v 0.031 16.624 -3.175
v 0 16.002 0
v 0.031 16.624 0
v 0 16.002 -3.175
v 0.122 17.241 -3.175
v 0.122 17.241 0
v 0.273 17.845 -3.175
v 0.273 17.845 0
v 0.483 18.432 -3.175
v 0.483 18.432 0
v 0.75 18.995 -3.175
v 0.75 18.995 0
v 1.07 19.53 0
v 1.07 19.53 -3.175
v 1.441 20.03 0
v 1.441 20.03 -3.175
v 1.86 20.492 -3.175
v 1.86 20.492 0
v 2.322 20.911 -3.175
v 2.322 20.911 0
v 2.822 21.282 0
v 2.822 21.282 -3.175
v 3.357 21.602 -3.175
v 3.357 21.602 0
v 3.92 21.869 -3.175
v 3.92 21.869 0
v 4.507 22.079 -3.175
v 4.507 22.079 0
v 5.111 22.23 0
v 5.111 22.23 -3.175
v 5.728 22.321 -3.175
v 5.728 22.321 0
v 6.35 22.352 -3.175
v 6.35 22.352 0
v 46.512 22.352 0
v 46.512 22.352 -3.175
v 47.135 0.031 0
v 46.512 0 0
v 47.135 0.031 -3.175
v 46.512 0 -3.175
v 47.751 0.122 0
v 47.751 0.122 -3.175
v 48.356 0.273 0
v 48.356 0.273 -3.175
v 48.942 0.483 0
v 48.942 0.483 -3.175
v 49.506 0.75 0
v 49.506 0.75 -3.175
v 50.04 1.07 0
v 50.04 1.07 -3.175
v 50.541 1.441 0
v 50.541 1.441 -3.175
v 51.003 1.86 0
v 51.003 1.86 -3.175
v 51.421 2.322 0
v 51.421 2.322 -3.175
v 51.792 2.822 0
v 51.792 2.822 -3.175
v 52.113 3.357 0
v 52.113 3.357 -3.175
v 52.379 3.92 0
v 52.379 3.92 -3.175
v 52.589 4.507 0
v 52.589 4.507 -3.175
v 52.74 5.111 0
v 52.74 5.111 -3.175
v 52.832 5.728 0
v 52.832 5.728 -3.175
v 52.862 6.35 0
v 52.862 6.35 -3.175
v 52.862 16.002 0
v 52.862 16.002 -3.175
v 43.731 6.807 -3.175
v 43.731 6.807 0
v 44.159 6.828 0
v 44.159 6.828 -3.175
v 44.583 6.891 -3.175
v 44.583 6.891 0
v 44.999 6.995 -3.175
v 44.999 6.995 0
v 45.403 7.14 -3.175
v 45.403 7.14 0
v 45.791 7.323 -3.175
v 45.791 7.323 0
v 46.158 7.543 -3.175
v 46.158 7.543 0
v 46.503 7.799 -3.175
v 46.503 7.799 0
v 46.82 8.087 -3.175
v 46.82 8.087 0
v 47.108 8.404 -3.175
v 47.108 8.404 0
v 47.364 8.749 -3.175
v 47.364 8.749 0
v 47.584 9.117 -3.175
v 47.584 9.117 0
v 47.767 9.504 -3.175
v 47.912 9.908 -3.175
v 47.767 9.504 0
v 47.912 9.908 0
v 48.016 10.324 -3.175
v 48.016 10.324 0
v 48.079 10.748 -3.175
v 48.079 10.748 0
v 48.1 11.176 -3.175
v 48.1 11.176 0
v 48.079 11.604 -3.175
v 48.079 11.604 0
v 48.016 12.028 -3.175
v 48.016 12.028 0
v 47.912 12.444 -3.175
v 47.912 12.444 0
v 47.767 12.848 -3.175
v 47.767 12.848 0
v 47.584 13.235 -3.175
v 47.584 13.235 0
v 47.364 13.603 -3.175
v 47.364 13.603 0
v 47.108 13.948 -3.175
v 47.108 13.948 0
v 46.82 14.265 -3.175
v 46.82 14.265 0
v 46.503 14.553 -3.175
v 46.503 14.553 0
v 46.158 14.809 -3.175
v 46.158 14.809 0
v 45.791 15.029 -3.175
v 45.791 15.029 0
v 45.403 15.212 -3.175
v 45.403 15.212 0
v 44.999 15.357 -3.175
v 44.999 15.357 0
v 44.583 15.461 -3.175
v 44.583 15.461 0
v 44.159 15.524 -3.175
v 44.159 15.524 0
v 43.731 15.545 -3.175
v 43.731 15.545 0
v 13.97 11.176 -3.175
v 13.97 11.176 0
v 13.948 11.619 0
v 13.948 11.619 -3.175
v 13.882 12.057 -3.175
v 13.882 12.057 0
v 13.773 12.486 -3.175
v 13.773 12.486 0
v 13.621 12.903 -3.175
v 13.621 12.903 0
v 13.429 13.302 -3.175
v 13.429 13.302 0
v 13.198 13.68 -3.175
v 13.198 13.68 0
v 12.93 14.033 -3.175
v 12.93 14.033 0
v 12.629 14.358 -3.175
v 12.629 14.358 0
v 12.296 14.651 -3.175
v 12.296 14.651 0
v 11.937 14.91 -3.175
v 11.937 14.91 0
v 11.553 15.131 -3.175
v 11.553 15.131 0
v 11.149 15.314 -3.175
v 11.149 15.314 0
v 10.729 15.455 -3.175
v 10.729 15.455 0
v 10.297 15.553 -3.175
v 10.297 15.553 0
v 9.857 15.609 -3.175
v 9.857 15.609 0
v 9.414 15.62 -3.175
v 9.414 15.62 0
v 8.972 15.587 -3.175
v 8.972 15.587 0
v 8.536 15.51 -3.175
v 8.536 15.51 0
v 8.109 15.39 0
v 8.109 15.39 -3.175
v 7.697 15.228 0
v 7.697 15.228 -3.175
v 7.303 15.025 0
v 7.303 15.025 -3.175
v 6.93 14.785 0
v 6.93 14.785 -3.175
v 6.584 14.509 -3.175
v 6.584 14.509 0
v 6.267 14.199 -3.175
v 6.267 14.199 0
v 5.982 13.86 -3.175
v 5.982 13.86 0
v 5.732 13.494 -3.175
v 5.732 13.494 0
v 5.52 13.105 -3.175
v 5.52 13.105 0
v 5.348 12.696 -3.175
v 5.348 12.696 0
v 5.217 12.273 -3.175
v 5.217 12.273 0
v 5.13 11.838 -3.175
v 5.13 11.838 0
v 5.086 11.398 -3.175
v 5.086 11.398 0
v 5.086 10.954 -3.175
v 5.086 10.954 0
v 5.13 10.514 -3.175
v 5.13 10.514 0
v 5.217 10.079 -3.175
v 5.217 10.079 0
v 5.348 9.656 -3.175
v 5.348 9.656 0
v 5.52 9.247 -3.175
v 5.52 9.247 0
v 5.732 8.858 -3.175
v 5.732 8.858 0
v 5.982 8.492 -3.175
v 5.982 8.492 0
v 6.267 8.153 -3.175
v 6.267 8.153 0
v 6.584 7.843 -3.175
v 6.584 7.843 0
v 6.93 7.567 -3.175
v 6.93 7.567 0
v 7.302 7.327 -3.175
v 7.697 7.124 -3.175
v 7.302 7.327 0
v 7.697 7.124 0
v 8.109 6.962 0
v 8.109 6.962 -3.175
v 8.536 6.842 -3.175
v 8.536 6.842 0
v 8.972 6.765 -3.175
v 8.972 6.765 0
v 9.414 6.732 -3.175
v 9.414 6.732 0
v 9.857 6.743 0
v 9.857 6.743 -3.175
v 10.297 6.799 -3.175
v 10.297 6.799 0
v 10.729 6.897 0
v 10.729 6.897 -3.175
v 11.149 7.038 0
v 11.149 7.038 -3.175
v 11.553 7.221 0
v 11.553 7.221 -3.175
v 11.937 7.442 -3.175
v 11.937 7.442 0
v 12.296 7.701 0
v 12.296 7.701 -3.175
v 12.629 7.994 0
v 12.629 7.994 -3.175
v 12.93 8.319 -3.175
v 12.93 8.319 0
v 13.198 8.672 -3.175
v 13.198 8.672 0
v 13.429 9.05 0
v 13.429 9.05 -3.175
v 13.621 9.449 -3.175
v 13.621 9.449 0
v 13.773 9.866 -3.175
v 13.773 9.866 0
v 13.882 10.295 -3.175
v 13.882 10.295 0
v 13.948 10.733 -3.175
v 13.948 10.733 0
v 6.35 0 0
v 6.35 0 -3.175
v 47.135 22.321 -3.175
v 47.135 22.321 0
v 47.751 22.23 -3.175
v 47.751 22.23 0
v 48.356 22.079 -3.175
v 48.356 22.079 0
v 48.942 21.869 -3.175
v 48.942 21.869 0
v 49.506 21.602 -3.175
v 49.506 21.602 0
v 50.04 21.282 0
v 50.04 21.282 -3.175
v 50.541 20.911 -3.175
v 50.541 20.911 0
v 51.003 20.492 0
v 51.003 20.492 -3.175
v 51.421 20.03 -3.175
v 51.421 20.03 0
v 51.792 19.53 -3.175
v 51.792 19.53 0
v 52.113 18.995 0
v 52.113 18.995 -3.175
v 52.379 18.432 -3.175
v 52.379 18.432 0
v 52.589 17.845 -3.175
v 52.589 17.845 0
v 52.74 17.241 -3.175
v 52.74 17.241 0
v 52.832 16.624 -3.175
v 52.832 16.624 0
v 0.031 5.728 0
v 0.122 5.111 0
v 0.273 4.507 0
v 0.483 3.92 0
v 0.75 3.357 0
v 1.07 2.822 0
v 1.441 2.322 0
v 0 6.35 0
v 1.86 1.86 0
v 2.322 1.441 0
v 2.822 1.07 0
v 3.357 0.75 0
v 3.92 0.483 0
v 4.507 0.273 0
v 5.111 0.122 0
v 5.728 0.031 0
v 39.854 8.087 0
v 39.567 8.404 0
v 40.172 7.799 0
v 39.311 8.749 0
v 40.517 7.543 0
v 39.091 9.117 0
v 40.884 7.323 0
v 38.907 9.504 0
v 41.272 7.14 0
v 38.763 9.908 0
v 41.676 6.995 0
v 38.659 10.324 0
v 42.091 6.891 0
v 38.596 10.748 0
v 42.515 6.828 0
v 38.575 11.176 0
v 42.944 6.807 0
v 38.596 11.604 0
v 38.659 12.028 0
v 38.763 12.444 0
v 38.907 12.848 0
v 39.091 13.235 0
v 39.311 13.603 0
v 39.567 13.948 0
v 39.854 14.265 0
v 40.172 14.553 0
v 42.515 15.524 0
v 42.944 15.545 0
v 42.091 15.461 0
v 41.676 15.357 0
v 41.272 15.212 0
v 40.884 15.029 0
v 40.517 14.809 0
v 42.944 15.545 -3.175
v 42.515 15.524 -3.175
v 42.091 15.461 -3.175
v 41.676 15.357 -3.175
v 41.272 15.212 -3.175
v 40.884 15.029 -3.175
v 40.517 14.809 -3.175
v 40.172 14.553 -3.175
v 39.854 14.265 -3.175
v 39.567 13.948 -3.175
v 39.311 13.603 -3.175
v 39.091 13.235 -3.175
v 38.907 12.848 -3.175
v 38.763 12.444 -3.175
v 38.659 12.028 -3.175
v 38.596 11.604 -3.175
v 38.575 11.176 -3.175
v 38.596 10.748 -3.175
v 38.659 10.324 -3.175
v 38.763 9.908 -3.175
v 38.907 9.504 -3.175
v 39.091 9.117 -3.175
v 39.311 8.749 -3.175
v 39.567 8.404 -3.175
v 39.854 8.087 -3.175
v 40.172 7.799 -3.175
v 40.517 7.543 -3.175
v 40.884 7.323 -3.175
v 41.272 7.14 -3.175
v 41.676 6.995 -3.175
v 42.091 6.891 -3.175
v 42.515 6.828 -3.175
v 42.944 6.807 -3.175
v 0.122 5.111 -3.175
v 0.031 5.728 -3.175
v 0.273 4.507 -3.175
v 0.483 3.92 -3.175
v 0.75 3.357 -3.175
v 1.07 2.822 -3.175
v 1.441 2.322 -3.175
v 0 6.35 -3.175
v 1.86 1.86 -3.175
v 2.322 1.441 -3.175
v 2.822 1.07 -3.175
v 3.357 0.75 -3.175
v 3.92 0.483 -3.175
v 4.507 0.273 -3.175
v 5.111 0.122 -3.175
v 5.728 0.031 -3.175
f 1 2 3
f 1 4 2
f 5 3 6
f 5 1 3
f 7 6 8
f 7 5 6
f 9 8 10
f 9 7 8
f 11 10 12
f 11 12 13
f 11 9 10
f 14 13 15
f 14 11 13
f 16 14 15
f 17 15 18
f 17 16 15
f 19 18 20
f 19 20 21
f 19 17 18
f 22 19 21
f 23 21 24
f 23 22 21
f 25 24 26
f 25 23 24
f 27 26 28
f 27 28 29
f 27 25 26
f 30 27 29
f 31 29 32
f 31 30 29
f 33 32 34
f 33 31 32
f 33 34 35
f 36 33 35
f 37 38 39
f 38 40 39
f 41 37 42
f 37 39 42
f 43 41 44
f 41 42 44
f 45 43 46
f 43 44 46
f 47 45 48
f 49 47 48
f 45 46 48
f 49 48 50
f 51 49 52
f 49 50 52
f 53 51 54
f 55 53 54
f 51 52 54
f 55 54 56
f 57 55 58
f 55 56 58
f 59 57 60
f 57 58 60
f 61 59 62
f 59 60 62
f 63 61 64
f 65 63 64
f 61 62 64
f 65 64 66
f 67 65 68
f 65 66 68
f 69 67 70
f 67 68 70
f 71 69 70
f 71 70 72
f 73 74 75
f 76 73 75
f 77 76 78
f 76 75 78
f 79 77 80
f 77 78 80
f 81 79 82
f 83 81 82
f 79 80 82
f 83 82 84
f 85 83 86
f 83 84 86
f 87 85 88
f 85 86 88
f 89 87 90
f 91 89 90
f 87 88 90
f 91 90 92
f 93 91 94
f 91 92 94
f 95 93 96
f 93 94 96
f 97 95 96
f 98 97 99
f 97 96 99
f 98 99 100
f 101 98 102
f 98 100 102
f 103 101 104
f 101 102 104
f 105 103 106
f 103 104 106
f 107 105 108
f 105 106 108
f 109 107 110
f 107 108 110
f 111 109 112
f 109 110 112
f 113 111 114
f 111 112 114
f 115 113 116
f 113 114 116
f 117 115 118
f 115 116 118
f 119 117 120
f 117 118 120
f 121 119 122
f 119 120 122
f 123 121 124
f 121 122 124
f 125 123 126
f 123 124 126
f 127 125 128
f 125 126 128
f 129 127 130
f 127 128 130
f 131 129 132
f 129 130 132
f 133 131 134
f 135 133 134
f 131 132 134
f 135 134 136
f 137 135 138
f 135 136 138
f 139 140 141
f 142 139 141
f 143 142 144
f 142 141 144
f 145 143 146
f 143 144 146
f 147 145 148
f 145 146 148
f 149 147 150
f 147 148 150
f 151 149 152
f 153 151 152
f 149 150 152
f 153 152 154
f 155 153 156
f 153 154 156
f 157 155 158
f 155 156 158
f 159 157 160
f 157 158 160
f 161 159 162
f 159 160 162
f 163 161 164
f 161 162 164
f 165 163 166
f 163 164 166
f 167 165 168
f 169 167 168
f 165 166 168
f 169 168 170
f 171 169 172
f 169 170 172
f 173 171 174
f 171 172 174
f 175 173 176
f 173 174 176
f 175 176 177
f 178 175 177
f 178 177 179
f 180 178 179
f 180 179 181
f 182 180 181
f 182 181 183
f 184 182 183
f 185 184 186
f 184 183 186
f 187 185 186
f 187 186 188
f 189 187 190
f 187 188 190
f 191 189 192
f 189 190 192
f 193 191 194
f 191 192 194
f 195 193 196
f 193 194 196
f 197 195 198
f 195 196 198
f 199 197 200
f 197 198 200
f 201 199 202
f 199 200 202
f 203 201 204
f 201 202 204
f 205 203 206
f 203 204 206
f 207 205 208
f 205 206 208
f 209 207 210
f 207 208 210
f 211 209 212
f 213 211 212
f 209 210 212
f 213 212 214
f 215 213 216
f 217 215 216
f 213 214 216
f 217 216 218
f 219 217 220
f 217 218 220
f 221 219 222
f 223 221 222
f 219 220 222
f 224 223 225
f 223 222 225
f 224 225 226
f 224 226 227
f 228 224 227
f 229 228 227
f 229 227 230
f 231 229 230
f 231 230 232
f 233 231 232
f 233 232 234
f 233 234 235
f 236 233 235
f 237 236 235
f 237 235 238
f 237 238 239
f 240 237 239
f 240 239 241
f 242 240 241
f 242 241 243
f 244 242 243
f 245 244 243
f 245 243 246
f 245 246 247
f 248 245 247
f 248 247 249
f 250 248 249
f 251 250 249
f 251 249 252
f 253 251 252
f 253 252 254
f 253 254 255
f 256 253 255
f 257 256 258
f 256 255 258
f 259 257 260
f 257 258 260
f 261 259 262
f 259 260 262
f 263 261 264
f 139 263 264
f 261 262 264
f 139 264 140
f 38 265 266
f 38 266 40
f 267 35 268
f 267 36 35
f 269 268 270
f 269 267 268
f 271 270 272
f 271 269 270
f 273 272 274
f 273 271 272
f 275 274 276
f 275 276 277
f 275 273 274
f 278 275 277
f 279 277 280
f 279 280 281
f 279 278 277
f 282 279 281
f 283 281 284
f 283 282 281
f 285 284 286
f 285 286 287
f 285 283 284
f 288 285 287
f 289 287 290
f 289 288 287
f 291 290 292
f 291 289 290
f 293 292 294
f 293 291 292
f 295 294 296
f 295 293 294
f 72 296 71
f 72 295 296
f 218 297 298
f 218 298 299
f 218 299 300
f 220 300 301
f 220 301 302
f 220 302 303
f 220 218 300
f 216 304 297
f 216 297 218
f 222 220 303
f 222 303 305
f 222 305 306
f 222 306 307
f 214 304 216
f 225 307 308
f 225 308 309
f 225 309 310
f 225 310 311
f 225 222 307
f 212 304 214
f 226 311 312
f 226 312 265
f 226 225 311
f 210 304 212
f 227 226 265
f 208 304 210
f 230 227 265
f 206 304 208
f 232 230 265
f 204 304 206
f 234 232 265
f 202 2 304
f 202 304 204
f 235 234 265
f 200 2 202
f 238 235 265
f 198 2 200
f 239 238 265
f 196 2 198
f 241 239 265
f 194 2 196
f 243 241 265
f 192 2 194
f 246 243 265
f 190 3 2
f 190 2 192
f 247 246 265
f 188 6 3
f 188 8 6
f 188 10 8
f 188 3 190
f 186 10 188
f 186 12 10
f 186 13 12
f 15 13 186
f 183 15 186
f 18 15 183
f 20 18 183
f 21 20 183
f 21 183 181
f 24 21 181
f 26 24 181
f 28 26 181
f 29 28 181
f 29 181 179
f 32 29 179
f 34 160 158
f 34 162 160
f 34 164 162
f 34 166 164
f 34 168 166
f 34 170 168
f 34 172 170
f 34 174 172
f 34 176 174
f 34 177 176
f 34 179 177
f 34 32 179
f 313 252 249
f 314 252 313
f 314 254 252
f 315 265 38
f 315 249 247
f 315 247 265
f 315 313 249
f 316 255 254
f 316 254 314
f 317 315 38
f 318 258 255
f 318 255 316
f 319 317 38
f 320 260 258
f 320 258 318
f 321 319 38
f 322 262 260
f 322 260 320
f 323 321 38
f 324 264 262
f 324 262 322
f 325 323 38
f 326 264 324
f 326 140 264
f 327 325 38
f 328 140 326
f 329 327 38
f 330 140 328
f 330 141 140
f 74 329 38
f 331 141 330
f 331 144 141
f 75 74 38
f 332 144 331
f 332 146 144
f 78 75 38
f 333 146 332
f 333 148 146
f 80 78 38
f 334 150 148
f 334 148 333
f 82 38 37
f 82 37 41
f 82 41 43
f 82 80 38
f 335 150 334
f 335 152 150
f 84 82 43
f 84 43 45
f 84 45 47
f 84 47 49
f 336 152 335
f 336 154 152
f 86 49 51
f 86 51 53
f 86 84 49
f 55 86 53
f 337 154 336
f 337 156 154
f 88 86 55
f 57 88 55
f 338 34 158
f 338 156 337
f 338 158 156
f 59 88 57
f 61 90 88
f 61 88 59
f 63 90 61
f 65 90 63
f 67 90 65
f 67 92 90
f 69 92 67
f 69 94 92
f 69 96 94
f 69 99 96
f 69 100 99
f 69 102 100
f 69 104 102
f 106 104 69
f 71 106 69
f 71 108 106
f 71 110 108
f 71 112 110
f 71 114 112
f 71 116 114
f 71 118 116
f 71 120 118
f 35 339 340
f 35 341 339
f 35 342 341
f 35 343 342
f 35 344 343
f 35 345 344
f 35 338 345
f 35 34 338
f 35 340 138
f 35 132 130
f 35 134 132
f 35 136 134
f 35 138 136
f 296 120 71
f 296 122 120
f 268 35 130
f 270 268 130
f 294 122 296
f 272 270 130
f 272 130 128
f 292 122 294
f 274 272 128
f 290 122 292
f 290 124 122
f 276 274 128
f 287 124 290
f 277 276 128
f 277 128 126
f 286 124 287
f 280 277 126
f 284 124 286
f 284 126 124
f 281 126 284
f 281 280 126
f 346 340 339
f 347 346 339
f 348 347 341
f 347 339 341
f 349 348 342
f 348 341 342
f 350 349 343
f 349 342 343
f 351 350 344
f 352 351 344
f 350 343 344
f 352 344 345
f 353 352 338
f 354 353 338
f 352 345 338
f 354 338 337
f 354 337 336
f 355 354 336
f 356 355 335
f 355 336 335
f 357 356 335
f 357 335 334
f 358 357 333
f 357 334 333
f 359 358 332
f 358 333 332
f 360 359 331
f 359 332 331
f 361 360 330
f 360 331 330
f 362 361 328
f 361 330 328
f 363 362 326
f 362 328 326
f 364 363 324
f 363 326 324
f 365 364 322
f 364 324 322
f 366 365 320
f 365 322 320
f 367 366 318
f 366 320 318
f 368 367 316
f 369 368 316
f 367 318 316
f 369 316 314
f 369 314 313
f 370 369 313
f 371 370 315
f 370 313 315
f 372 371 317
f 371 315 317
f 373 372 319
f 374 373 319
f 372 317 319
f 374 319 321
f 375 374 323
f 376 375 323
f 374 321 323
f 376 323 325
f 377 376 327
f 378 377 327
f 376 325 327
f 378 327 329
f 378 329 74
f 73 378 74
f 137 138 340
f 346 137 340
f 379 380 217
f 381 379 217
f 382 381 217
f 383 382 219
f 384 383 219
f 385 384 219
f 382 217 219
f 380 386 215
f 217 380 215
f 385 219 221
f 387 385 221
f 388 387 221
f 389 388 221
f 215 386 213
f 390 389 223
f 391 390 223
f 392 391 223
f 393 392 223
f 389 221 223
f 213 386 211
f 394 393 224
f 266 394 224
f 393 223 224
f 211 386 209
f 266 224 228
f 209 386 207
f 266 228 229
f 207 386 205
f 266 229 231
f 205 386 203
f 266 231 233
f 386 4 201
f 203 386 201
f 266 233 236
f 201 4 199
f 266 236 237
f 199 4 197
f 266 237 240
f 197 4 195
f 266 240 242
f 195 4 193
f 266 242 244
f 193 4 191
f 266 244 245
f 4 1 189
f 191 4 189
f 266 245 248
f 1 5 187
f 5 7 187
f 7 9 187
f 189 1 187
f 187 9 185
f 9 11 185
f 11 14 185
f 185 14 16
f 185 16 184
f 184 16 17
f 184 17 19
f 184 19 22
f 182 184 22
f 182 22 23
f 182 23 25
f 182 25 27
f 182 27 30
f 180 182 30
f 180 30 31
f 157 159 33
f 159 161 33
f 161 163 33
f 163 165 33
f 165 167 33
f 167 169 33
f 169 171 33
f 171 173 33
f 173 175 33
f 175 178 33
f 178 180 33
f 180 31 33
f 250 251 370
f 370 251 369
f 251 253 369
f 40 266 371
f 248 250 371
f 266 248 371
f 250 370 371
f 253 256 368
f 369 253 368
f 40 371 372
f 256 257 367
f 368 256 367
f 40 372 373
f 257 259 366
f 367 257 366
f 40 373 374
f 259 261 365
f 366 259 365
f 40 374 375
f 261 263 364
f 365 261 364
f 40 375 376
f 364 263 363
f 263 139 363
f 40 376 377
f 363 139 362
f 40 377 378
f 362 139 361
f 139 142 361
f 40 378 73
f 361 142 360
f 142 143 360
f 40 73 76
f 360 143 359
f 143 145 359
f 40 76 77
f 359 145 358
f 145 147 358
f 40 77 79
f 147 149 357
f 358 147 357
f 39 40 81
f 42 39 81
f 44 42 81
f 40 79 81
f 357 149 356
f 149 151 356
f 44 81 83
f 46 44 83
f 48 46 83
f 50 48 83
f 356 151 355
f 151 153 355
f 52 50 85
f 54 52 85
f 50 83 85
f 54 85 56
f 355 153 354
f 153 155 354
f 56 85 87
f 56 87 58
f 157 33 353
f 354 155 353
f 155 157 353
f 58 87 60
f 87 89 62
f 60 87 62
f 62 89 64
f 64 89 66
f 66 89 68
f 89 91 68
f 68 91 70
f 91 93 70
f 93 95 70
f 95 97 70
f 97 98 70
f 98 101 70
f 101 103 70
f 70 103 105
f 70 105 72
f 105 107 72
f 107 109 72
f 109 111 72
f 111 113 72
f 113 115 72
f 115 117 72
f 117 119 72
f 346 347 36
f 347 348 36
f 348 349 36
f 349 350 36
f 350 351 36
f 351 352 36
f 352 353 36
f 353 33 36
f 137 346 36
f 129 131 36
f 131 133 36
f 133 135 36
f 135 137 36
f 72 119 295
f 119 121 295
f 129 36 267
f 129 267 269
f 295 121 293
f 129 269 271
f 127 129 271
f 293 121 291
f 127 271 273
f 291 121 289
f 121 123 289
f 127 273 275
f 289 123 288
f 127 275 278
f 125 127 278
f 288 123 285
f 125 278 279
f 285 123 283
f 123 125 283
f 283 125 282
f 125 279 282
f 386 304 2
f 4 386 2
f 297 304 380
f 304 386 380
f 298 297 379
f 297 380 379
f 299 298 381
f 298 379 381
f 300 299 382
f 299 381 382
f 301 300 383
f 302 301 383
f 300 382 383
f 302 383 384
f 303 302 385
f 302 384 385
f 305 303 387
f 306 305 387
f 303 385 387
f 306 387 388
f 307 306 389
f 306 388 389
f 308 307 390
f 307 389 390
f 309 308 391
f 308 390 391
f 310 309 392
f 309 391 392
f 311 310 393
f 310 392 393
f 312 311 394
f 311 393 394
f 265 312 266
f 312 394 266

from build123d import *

# Parameters (mm, degrees)
SKETCH1_W          = 52.8624
SKETCH1_H          = 22.352
BASE_FLANGE1_DEPTH = 3.175
SKETCH6_R          = 4.445
CUT_EXTRUDE1_DEPTH = 3.175
FILLET1_R          = 6.35


# Sheet-metal steps are written as plain solids
with BuildPart() as part:
    # Sketch1 → Base-Flange1 (new body)
    with BuildSketch(Plane.XY):
        with Locations((26.4312, 11.176)):
            Rectangle(SKETCH1_W, SKETCH1_H)
    extrude(amount=-BASE_FLANGE1_DEPTH)

    # Sketch6 → Cut-Extrude1 (cut)
    with BuildSketch(Plane.XY):
        with Locations((9.525, 11.176)):
            Circle(SKETCH6_R)
        with BuildLine():
            Line((42.9437, 6.8072), (43.7311, 6.8072))
            ThreePointArc((43.7311, 6.8072), (48.0999, 11.176), (43.7311, 15.5448))
            Line((43.7311, 15.5448), (42.9437, 15.5448))
            ThreePointArc((42.9437, 15.5448), (38.5749, 11.176), (42.9437, 6.8072))
        make_face()
    extrude(amount=-CUT_EXTRUDE1_DEPTH, mode=Mode.SUBTRACT)

    # Fillet1
    fillet1_edges = [part.edges().sort_by_distance(p)[0] for p in [
        (0, 22.352, -1.5875),
        (52.8624, 22.352, -1.5875),
        (52.8624, 0, -1.5875),
        (0, 0, -1.5875),
    ]]
    fillet(fillet1_edges, radius=FILLET1_R)


solid = part.part
